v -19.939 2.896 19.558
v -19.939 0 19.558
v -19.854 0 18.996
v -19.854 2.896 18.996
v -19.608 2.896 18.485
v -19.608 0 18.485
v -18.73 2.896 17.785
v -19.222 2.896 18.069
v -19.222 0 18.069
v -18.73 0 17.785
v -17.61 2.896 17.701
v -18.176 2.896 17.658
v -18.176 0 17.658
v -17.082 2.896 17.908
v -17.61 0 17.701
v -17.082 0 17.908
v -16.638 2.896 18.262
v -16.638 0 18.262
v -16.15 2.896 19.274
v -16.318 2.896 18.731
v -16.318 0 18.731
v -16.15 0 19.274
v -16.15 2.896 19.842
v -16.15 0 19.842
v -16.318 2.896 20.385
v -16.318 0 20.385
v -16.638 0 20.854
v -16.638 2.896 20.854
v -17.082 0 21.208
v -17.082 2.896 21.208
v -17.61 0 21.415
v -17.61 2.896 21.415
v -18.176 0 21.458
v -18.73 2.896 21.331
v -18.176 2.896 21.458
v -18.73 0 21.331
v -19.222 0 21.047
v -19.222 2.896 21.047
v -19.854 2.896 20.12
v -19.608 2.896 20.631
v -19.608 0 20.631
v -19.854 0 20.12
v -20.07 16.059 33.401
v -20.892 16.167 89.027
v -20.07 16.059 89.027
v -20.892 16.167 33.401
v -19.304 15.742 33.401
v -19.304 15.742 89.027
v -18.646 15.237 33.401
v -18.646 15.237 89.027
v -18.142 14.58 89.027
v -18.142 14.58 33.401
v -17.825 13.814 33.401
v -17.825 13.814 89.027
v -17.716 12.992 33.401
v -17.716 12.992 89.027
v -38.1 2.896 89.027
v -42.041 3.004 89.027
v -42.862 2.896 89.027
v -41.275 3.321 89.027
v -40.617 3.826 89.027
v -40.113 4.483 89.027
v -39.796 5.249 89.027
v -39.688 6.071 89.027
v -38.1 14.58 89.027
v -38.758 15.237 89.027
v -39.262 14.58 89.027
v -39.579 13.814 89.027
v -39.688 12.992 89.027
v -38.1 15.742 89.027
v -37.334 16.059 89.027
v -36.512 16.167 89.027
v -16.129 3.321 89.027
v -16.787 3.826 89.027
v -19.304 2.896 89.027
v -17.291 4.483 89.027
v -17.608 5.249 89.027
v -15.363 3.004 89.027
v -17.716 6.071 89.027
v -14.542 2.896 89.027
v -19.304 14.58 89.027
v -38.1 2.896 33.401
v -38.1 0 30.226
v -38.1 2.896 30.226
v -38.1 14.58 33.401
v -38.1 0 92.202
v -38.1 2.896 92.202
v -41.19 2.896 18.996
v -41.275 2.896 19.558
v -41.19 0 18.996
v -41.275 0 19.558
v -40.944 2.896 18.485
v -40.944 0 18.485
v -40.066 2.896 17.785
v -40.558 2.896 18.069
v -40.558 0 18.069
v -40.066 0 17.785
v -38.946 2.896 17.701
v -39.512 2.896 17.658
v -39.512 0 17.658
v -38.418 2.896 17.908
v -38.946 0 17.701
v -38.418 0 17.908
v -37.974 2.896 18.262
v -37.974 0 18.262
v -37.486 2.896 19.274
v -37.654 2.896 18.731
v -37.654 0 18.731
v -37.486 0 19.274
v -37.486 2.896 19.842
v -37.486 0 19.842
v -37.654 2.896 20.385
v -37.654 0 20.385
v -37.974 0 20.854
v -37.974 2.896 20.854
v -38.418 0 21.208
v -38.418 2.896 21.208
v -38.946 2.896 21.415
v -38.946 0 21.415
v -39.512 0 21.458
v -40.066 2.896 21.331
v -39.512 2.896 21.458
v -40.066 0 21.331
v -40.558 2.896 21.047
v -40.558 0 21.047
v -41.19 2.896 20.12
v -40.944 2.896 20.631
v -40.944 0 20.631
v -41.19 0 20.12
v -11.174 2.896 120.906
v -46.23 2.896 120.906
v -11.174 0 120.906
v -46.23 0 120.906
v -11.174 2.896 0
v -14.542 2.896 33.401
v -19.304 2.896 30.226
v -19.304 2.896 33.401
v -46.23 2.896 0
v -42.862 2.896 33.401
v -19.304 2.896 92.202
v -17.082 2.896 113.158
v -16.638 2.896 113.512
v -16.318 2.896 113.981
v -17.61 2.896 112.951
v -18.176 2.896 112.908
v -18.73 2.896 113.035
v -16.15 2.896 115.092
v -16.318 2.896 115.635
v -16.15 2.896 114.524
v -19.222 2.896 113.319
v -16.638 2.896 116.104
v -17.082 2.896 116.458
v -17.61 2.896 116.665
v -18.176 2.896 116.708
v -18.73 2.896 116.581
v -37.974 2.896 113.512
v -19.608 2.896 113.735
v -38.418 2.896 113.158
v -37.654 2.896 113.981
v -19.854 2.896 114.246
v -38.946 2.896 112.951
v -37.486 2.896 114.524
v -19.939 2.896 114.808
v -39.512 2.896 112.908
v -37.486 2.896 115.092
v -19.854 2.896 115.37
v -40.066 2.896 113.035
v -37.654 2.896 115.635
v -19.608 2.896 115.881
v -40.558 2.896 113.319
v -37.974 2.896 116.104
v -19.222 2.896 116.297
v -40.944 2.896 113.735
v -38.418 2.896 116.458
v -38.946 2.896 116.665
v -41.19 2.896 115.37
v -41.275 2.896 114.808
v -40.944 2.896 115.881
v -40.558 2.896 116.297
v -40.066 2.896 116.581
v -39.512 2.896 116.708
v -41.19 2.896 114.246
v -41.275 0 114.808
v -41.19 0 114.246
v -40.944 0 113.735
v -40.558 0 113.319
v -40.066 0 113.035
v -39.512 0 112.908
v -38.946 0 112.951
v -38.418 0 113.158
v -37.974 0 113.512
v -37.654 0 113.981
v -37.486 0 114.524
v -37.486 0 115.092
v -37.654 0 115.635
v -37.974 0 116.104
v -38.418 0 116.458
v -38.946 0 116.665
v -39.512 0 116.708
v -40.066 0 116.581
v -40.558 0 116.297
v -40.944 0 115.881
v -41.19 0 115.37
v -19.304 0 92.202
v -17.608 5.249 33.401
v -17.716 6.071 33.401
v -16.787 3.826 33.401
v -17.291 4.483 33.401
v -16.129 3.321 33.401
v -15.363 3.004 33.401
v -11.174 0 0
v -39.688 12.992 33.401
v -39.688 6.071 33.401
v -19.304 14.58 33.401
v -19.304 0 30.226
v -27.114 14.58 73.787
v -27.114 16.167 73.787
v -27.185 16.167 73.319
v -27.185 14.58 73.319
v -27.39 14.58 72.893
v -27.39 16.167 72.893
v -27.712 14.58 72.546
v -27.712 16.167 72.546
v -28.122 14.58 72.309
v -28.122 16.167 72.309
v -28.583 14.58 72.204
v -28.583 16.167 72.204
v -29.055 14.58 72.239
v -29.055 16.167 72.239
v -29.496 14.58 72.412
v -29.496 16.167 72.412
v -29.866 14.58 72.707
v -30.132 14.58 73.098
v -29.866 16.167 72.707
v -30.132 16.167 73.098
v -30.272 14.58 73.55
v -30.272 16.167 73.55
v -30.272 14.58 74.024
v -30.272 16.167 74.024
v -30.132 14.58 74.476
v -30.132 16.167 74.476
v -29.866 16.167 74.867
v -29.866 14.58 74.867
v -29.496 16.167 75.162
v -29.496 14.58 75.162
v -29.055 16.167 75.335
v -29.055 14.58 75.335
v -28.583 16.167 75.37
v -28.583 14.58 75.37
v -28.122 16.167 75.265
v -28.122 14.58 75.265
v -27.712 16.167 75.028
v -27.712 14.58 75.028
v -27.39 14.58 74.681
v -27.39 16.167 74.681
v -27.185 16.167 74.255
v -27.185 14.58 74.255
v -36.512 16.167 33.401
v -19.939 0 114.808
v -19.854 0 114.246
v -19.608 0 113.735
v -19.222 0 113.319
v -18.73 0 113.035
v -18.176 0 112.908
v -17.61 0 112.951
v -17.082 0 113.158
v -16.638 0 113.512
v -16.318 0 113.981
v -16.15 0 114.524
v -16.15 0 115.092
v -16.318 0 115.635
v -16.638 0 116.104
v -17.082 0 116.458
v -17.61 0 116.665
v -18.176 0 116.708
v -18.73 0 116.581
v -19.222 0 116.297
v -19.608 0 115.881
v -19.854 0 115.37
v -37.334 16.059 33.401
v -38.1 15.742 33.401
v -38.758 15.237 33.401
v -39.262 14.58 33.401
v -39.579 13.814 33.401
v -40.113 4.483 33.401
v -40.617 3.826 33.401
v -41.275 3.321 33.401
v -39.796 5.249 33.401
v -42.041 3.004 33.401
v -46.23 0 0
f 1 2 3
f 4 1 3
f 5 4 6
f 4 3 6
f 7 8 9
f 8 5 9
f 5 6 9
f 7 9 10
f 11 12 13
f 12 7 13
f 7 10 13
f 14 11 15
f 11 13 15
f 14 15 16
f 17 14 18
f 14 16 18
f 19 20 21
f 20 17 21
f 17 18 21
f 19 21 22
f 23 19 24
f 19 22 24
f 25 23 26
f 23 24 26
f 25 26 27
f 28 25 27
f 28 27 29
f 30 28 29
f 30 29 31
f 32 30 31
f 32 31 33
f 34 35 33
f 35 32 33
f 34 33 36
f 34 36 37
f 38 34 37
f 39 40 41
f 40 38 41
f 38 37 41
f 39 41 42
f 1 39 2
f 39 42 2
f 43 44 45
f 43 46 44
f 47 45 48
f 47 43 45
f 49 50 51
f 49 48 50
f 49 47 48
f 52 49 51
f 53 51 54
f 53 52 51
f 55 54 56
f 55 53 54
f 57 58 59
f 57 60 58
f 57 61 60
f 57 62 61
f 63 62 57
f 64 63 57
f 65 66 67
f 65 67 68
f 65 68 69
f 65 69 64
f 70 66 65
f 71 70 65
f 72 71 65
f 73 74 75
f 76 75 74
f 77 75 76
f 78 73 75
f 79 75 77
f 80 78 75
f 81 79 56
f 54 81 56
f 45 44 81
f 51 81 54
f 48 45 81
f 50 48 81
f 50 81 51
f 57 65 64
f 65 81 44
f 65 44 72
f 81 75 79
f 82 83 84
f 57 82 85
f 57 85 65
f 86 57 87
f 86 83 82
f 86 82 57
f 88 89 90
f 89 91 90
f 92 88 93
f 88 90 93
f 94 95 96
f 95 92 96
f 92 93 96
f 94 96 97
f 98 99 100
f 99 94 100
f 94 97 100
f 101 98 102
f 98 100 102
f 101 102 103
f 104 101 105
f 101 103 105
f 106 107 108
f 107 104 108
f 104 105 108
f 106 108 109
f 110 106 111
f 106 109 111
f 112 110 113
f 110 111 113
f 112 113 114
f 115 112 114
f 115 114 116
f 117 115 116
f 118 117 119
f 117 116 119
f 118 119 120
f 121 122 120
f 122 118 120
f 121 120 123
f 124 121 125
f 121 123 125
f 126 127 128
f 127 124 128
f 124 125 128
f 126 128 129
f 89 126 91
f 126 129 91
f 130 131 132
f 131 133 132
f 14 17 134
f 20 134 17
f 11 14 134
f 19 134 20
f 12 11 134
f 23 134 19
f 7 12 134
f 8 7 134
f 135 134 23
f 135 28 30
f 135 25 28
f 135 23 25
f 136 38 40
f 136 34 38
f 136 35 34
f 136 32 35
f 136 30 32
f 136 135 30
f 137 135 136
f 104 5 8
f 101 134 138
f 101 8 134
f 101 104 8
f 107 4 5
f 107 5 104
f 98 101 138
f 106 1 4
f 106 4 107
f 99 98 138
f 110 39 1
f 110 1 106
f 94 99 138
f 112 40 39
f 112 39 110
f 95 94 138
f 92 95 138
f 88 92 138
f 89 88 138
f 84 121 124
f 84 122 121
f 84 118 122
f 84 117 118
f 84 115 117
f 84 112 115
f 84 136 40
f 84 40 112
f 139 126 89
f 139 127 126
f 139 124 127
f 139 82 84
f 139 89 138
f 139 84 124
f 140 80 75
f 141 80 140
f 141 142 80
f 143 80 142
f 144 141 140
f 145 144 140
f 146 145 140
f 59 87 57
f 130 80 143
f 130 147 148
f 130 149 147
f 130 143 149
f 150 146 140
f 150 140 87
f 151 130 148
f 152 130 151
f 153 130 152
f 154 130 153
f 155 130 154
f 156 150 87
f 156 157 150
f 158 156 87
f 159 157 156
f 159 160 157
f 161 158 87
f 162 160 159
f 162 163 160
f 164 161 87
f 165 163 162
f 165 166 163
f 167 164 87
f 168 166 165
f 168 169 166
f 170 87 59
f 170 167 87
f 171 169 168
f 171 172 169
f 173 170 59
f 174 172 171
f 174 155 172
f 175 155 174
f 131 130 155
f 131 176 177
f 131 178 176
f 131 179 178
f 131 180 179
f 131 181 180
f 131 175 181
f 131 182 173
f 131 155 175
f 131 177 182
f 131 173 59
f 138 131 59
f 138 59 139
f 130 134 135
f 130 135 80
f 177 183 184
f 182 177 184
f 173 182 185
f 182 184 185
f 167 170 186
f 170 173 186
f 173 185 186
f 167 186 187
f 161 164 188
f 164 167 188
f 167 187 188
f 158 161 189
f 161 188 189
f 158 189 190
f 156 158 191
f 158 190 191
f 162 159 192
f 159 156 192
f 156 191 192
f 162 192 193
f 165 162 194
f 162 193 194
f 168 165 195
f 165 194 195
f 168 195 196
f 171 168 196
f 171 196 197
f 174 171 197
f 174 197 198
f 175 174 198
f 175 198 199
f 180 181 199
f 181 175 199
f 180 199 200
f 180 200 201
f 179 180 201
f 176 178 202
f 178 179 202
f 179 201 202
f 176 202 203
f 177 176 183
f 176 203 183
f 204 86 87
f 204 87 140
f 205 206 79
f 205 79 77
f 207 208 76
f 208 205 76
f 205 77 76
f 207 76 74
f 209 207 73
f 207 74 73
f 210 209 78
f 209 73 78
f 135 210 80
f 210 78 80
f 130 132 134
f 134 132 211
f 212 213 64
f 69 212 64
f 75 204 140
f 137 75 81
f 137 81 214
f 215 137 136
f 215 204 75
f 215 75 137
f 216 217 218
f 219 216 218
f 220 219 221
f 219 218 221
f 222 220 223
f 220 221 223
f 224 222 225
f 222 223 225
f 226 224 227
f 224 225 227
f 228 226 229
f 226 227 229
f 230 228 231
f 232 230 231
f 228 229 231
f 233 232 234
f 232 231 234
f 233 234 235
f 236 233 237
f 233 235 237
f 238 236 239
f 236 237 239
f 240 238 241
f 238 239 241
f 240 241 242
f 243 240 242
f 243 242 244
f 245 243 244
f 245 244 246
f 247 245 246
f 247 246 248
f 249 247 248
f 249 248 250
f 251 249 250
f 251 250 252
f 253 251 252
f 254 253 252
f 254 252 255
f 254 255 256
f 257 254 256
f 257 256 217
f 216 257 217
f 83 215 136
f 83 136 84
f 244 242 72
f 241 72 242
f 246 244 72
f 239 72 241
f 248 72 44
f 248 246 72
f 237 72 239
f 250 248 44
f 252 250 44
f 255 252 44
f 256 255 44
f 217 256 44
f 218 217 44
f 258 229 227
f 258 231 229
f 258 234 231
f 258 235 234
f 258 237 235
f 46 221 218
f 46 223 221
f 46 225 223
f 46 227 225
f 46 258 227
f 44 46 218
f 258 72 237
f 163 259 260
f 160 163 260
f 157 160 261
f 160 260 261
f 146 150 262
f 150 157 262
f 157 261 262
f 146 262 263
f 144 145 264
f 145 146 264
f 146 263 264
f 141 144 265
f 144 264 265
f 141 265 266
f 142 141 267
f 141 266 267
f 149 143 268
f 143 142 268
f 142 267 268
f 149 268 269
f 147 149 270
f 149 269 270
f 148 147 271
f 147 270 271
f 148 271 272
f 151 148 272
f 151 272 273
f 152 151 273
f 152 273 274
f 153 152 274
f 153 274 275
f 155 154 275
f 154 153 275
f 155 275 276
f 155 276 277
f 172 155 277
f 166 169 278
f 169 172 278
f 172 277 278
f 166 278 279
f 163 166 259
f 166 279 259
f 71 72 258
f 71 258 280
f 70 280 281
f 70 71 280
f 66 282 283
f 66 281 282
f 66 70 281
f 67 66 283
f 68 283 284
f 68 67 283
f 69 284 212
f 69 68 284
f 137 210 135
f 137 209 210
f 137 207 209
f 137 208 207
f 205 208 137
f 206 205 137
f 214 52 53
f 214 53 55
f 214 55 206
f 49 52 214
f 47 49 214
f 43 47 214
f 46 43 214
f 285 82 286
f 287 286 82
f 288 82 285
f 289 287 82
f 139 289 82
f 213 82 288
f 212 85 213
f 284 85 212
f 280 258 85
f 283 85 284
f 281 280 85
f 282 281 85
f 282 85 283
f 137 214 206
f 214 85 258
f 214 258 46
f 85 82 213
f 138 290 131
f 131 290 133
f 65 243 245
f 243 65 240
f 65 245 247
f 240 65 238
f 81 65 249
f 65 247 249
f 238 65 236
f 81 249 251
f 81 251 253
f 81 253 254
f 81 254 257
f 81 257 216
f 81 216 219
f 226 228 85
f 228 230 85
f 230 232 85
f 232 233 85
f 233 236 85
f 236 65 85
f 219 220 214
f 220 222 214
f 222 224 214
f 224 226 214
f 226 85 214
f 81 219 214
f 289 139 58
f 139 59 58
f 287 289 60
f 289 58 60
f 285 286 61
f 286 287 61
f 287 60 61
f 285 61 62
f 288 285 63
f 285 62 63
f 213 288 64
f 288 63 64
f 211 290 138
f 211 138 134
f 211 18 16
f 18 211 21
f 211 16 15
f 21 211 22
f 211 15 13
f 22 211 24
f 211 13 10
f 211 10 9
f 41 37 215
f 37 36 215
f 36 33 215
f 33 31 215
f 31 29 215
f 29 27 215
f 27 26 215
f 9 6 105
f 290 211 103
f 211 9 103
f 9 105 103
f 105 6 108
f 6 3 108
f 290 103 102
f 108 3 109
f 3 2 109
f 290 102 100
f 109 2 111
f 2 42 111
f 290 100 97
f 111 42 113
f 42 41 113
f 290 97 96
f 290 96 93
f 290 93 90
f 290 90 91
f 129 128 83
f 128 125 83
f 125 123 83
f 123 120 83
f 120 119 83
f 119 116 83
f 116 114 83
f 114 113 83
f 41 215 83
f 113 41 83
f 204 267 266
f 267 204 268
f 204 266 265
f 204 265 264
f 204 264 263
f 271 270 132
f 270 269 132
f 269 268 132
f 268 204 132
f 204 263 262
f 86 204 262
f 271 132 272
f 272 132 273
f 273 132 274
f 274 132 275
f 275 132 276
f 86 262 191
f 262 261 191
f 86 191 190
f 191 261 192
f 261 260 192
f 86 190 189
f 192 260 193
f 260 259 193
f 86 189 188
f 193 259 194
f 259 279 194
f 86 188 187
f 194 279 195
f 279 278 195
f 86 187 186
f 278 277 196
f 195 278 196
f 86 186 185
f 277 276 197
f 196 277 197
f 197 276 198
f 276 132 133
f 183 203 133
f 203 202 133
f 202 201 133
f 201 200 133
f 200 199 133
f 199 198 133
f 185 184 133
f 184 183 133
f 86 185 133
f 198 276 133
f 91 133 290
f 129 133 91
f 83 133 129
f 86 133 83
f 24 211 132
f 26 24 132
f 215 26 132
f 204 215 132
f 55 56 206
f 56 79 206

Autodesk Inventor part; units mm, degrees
ref_plane "YZ Plane" through (0, 0, 0) normal (1, 0, 0) x (0, 1, 0)
ref_plane "XZ Plane" through (0, 0, 0) normal (0, 1, 0) x (-1, 0, 0)
ref_plane "XY Plane" through (0, 0, 0) normal (0, 0, 1) x (1, 0, 0)
sketch "Sketch1" plane through (0, 0, 0) normal (0, 1, 0) x (-1, 0, 0)
  line L0 (0, 0) -> (57.404, 0) construction
  line L1 (57.404, 0) -> (57.404, 120.904) construction
  line L2 (57.404, 120.904) -> (50.8, 132.334) construction
  line L3 (50.8, 132.334) -> (6.858, 132.334) construction
  line L4 (6.858, 132.334) -> (0, 121.158) construction
  line L5 (0, 121.158) -> (0, 0) construction
  circle A0 centre (4.318, 10.414) radius 0.51 construction
  circle A1 centre (4.318, 17.526) radius 0.51 construction
  circle A2 centre (4.318, 15.366) radius 0.55 construction
  circle A3 centre (4.318, 24.638) radius 0.51 construction
  circle A4 centre (4.318, 22.478) radius 0.55 construction
  circle A5 centre (6.858, 3.302) radius 0.51 construction
  circle A6 centre (6.858, 10.414) radius 0.51 construction
  circle A7 centre (6.858, 17.526) radius 0.51 construction
  circle A8 centre (4.318, 3.302) radius 0.51 construction
  circle A9 centre (4.318, 8.254) radius 0.55 construction
  circle A10 centre (18.542, 10.879) radius 1.27 construction
  circle A11 centre (9.398, 10.414) radius 0.51 construction
  circle A12 centre (9.398, 17.526) radius 0.51 construction
  circle A13 centre (18.034, 19.558) radius 2.15 construction
  circle A14 centre (9.398, 3.302) radius 0.51 construction
  circle A15 centre (23.622, 3.259) radius 1.995 construction
  circle A16 centre (21.082, 13.419) radius 0.8 construction
  circle A17 centre (26.162, 13.419) radius 0.8 construction
  circle A18 centre (53.086, 3.81) radius 0.51 construction
  circle A19 centre (48.006, 3.81) radius 0.51 construction
  circle A20 centre (50.546, 3.81) radius 0.51 construction
  circle A21 centre (53.086, 5.97) radius 0.55 construction
  circle A22 centre (50.546, 10.922) radius 0.51 construction
  circle A23 centre (53.086, 10.922) radius 0.51 construction
  circle A24 centre (48.006, 10.922) radius 0.51 construction
  circle A25 centre (48.006, 18.034) radius 0.51 construction
  circle A26 centre (50.546, 18.034) radius 0.51 construction
  circle A27 centre (53.086, 18.034) radius 0.51 construction
  circle A28 centre (53.086, 13.082) radius 0.55 construction
  circle A29 centre (31.242, 13.419) radius 0.8 construction
  circle A30 centre (36.322, 13.419) radius 0.8 construction
  circle A31 centre (33.782, 3.259) radius 1.995 construction
  circle A32 centre (39.37, 19.558) radius 2.15 construction
  circle A33 centre (38.862, 10.879) radius 1.27 construction
  circle A34 centre (53.086, 20.194) radius 0.55 construction
  circle A35 centre (21.082, 72.644) radius 0.5 construction
  circle A36 centre (21.082, 37.084) radius 0.5 construction
  circle A37 centre (36.322, 52.324) radius 0.5 construction
  circle A38 centre (48.006, 67.818) radius 0.51 construction
  circle A39 centre (55.626, 10.922) radius 0.51 construction
  circle A40 centre (55.626, 3.81) radius 0.51 construction
  circle A41 centre (55.626, 18.034) radius 0.51 construction
  circle A42 centre (1.778, 3.302) radius 0.51 construction
  circle A43 centre (1.778, 10.414) radius 0.51 construction
  circle A44 centre (1.778, 17.526) radius 0.51 construction
  circle A45 centre (1.778, 88.646) radius 0.51 construction
  circle A46 centre (4.318, 88.646) radius 0.51 construction
  circle A47 centre (9.398, 88.646) radius 0.51 construction
  circle A48 centre (6.858, 88.646) radius 0.51 construction
  circle A49 centre (21.082, 87.884) radius 0.5 construction
  circle A50 centre (55.626, 89.154) radius 0.51 construction
  circle A51 centre (53.086, 89.154) radius 0.51 construction
  circle A52 centre (50.546, 89.154) radius 0.51 construction
  circle A53 centre (48.006, 89.154) radius 0.51 construction
  circle A54 centre (36.322, 87.884) radius 0.5 construction
  circle A55 centre (53.086, 84.202) radius 0.55 construction
  circle A56 centre (36.322, 85.344) radius 0.5 construction
  circle A57 centre (4.318, 86.486) radius 0.55 construction
  circle A58 centre (21.082, 85.344) radius 0.5 construction
  circle A59 centre (9.398, 60.198) radius 0.51 construction
  circle A60 centre (21.082, 65.024) radius 0.5 construction
  circle A61 centre (21.082, 62.484) radius 0.5 construction
  circle A62 centre (21.082, 59.944) radius 0.5 construction
  circle A63 centre (9.398, 67.31) radius 0.51 construction
  circle A64 centre (21.082, 75.184) radius 0.5 construction
  circle A65 centre (21.082, 67.564) radius 0.5 construction
  circle A66 centre (21.082, 70.104) radius 0.5 construction
  circle A67 centre (9.398, 74.422) radius 0.51 construction
  circle A68 centre (21.082, 80.264) radius 0.5 construction
  circle A69 centre (21.082, 77.724) radius 0.5 construction
  circle A70 centre (21.082, 82.804) radius 0.5 construction
  circle A71 centre (9.398, 81.534) radius 0.51 construction
  circle A72 centre (50.546, 82.042) radius 0.51 construction
  circle A73 centre (48.006, 82.042) radius 0.51 construction
  circle A74 centre (36.322, 77.724) radius 0.5 construction
  circle A75 centre (36.322, 80.264) radius 0.5 construction
  circle A76 centre (36.322, 82.804) radius 0.5 construction
  circle A77 centre (50.546, 74.93) radius 0.51 construction
  circle A78 centre (48.006, 74.93) radius 0.51 construction
  circle A79 centre (36.322, 75.184) radius 0.5 construction
  circle A80 centre (36.322, 72.644) radius 0.5 construction
  circle A81 centre (36.322, 62.484) radius 0.5 construction
  circle A82 centre (36.322, 65.024) radius 0.5 construction
  circle A83 centre (36.322, 70.104) radius 0.5 construction
  circle A84 centre (36.322, 67.564) radius 0.5 construction
  circle A85 centre (50.546, 67.818) radius 0.51 construction
  circle A86 centre (50.546, 60.706) radius 0.51 construction
  circle A87 centre (48.006, 60.706) radius 0.51 construction
  circle A88 centre (36.322, 59.944) radius 0.5 construction
  circle A89 centre (4.318, 65.15) radius 0.55 construction
  circle A90 centre (4.318, 60.198) radius 0.51 construction
  circle A91 centre (4.318, 67.31) radius 0.51 construction
  circle A92 centre (6.858, 67.31) radius 0.51 construction
  circle A93 centre (6.858, 60.198) radius 0.51 construction
  circle A94 centre (6.858, 81.534) radius 0.51 construction
  circle A95 centre (6.858, 74.422) radius 0.51 construction
  circle A96 centre (4.318, 81.534) radius 0.51 construction
  circle A97 centre (4.318, 72.262) radius 0.55 construction
  circle A98 centre (4.318, 74.422) radius 0.51 construction
  circle A99 centre (4.318, 79.374) radius 0.55 construction
  circle A100 centre (53.086, 69.978) radius 0.55 construction
  circle A101 centre (53.086, 67.818) radius 0.51 construction
  circle A102 centre (53.086, 74.93) radius 0.51 construction
  circle A103 centre (53.086, 60.706) radius 0.51 construction
  circle A104 centre (53.086, 62.866) radius 0.55 construction
  circle A105 centre (53.086, 77.09) radius 0.55 construction
  circle A106 centre (53.086, 82.042) radius 0.51 construction
  circle A107 centre (1.778, 60.198) radius 0.51 construction
  circle A108 centre (1.778, 67.31) radius 0.51 construction
  circle A109 centre (1.778, 81.534) radius 0.51 construction
  circle A110 centre (1.778, 74.422) radius 0.51 construction
  circle A111 centre (55.626, 60.706) radius 0.51 construction
  circle A112 centre (55.626, 67.818) radius 0.51 construction
  circle A113 centre (55.626, 82.042) radius 0.51 construction
  circle A114 centre (55.626, 74.93) radius 0.51 construction
  circle A115 centre (36.322, 57.404) radius 0.5 construction
  circle A116 centre (21.082, 57.404) radius 0.5 construction
  circle A117 centre (4.318, 58.038) radius 0.55 construction
  circle A118 centre (1.778, 24.638) radius 0.51 construction
  circle A119 centre (1.778, 31.75) radius 0.51 construction
  circle A120 centre (4.318, 31.75) radius 0.51 construction
  circle A121 centre (4.318, 29.59) radius 0.55 construction
  circle A122 centre (6.858, 24.638) radius 0.51 construction
  circle A123 centre (6.858, 31.75) radius 0.51 construction
  circle A124 centre (6.858, 38.862) radius 0.51 construction
  circle A125 centre (4.318, 38.862) radius 0.51 construction
  circle A126 centre (1.778, 38.862) radius 0.51 construction
  circle A127 centre (4.318, 36.702) radius 0.55 construction
  circle A128 centre (9.398, 24.638) radius 0.51 construction
  circle A129 centre (21.082, 39.624) radius 0.5 construction
  circle A130 centre (21.082, 32.004) radius 0.5 construction
  circle A131 centre (21.082, 34.544) radius 0.5 construction
  circle A132 centre (9.398, 31.75) radius 0.51 construction
  circle A133 centre (9.398, 38.862) radius 0.51 construction
  circle A134 centre (1.778, 45.974) radius 0.51 construction
  circle A135 centre (6.858, 45.974) radius 0.51 construction
  circle A136 centre (4.318, 45.974) radius 0.51 construction
  circle A137 centre (4.318, 43.814) radius 0.55 construction
  circle A138 centre (9.398, 45.974) radius 0.51 construction
  circle A139 centre (21.082, 44.704) radius 0.5 construction
  circle A140 centre (21.082, 42.164) radius 0.5 construction
  circle A141 centre (21.082, 47.244) radius 0.5 construction
  circle A142 centre (55.626, 46.482) radius 0.51 construction
  circle A143 centre (53.086, 46.482) radius 0.51 construction
  circle A144 centre (50.546, 46.482) radius 0.51 construction
  circle A145 centre (55.626, 39.37) radius 0.51 construction
  circle A146 centre (53.086, 39.37) radius 0.51 construction
  circle A147 centre (50.546, 39.37) radius 0.51 construction
  circle A148 centre (53.086, 41.53) radius 0.55 construction
  circle A149 centre (48.006, 46.482) radius 0.51 construction
  circle A150 centre (48.006, 32.258) radius 0.51 construction
  circle A151 centre (50.546, 32.258) radius 0.51 construction
  circle A152 centre (55.626, 32.258) radius 0.51 construction
  circle A153 centre (53.086, 32.258) radius 0.51 construction
  circle A154 centre (48.006, 39.37) radius 0.51 construction
  circle A155 centre (53.086, 34.418) radius 0.55 construction
  circle A156 centre (53.086, 27.306) radius 0.55 construction
  circle A157 centre (36.322, 34.544) radius 0.5 construction
  circle A158 centre (36.322, 39.624) radius 0.5 construction
  circle A159 centre (36.322, 37.084) radius 0.5 construction
  circle A160 centre (36.322, 42.164) radius 0.5 construction
  circle A161 centre (36.322, 47.244) radius 0.5 construction
  circle A162 centre (36.322, 44.704) radius 0.5 construction
  circle A163 centre (36.322, 32.004) radius 0.5 construction
  circle A164 centre (55.626, 25.146) radius 0.51 construction
  circle A165 centre (53.086, 25.146) radius 0.51 construction
  circle A166 centre (48.006, 25.146) radius 0.51 construction
  circle A167 centre (50.546, 25.146) radius 0.51 construction
  circle A168 centre (36.322, 49.784) radius 0.5 construction
  circle A169 centre (21.082, 49.784) radius 0.5 construction
  circle A170 centre (53.086, 48.642) radius 0.55 construction
  circle A171 centre (4.318, 53.086) radius 0.51 construction
  circle A172 centre (4.318, 50.926) radius 0.55 construction
  circle A173 centre (6.858, 53.086) radius 0.51 construction
  circle A174 centre (9.398, 53.086) radius 0.51 construction
  circle A175 centre (21.082, 52.324) radius 0.5 construction
  circle A176 centre (55.626, 53.594) radius 0.51 construction
  circle A177 centre (53.086, 53.594) radius 0.51 construction
  circle A178 centre (48.006, 53.594) radius 0.51 construction
  circle A179 centre (50.546, 53.594) radius 0.51 construction
  circle A180 centre (1.778, 53.086) radius 0.51 construction
  circle A181 centre (53.086, 55.754) radius 0.55 construction
  circle A182 centre (36.322, 54.864) radius 0.5 construction
  circle A183 centre (21.082, 54.864) radius 0.5 construction
  circle A184 centre (55.626, 96.266) radius 0.51 construction
  circle A185 centre (53.086, 96.266) radius 0.51 construction
  circle A186 centre (53.086, 91.314) radius 0.55 construction
  circle A187 centre (50.546, 96.266) radius 0.51 construction
  circle A188 centre (48.006, 96.266) radius 0.51 construction
  circle A189 centre (36.322, 90.424) radius 0.5 construction
  circle A190 centre (6.858, 95.758) radius 0.51 construction
  circle A191 centre (9.398, 95.758) radius 0.51 construction
  circle A192 centre (21.082, 90.424) radius 0.5 construction
  circle A193 centre (4.318, 95.758) radius 0.51 construction
  circle A194 centre (4.318, 93.598) radius 0.55 construction
  circle A195 centre (1.778, 95.758) radius 0.51 construction
  circle A196 centre (55.626, 117.602) radius 0.51 construction
  circle A197 centre (53.086, 117.602) radius 0.51 construction
  circle A198 centre (48.006, 117.602) radius 0.51 construction
  circle A199 centre (50.546, 117.602) radius 0.51 construction
  circle A200 centre (53.086, 112.65) radius 0.55 construction
  circle A201 centre (53.086, 110.49) radius 0.51 construction
  circle A202 centre (48.006, 110.49) radius 0.51 construction
  circle A203 centre (50.546, 110.49) radius 0.51 construction
  circle A204 centre (55.626, 110.49) radius 0.51 construction
  circle A205 centre (39.37, 114.808) radius 2.15 construction
  circle A206 centre (9.398, 109.982) radius 0.51 construction
  circle A207 centre (9.398, 117.094) radius 0.51 construction
  circle A208 centre (18.034, 114.808) radius 2.15 construction
  circle A209 centre (9.398, 102.87) radius 0.51 construction
  circle A210 centre (53.086, 103.378) radius 0.51 construction
  circle A211 centre (48.006, 103.378) radius 0.51 construction
  circle A212 centre (50.546, 103.378) radius 0.51 construction
  circle A213 centre (53.086, 105.538) radius 0.55 construction
  circle A214 centre (55.626, 103.378) radius 0.51 construction
  circle A215 centre (4.318, 117.094) radius 0.51 construction
  circle A216 centre (4.318, 114.934) radius 0.55 construction
  circle A217 centre (6.858, 117.094) radius 0.51 construction
  circle A218 centre (4.318, 109.982) radius 0.51 construction
  circle A219 centre (6.858, 109.982) radius 0.51 construction
  circle A220 centre (6.858, 102.87) radius 0.51 construction
  circle A221 centre (4.318, 102.87) radius 0.51 construction
  circle A222 centre (4.318, 107.822) radius 0.55 construction
  circle A223 centre (4.318, 100.71) radius 0.55 construction
  circle A224 centre (1.778, 117.094) radius 0.51 construction
  circle A225 centre (1.778, 109.982) radius 0.51 construction
  circle A226 centre (1.778, 102.87) radius 0.51 construction
  circle A227 centre (53.086, 98.426) radius 0.55 construction
  circle A228 centre (10.16, 122.682) radius 0.51 construction
  circle A229 centre (17.272, 122.682) radius 0.51 construction
  circle A230 centre (24.384, 122.682) radius 0.51 construction
  circle A231 centre (38.608, 122.682) radius 0.51 construction
  circle A232 centre (31.496, 122.682) radius 0.51 construction
  circle A233 centre (53.086, 119.762) radius 0.55 construction
  circle A234 centre (45.72, 122.682) radius 0.51 construction
  circle A235 centre (24.384, 130.302) radius 0.51 construction
  circle A236 centre (17.272, 130.302) radius 0.51 construction
  circle A237 centre (22.224, 127.762) radius 0.55 construction
  circle A238 centre (17.272, 127.762) radius 0.51 construction
  circle A239 centre (31.496, 127.762) radius 0.51 construction
  circle A240 centre (29.336, 127.762) radius 0.55 construction
  circle A241 centre (24.384, 127.762) radius 0.51 construction
  circle A242 centre (31.496, 130.302) radius 0.51 construction
  circle A243 centre (17.272, 125.222) radius 0.51 construction
  circle A244 centre (24.384, 125.222) radius 0.51 construction
  circle A245 centre (31.496, 125.222) radius 0.51 construction
  circle A246 centre (38.608, 125.222) radius 0.51 construction
  circle A247 centre (36.448, 127.762) radius 0.55 construction
  circle A248 centre (38.608, 127.762) radius 0.51 construction
  circle A249 centre (38.608, 130.302) radius 0.51 construction
  circle A250 centre (45.72, 130.302) radius 0.51 construction
  circle A251 centre (45.72, 127.762) radius 0.51 construction
  circle A252 centre (43.56, 127.762) radius 0.55 construction
  circle A253 centre (45.72, 125.222) radius 0.51 construction
  circle A254 centre (10.16, 125.222) radius 0.51 construction
  circle A255 centre (10.16, 127.762) radius 0.51 construction
  circle A256 centre (10.16, 130.302) radius 0.51 construction
  circle A257 centre (15.112, 127.762) radius 0.55 construction
  circle A258 centre (8, 127.762) radius 0.55 construction
  circle A259 centre (4.318, 1.142) radius 0.55 construction
  line L6 (-0.0762, -0.0762) -> (57.4802, -0.0762) construction
  line L7 (57.4802, -0.0762) -> (57.4802, 120.9244) construction
  line L8 (57.4802, 120.9244) -> (50.844, 132.4102) construction
  line L9 (50.844, 132.4102) -> (6.8154, 132.4102) construction
  line L10 (6.8154, 132.4102) -> (-0.0762, 121.1795) construction
  line L11 (-0.0762, 121.1795) -> (-0.0762, -0.0762) construction
  line L12 (-1.6637, -1.6637) -> (59.0677, -1.6637) construction
  line L13 (59.0677, -1.6637) -> (59.0677, 121.3501) construction
  line L14 (59.0677, 121.3501) -> (51.7602, 133.9977) construction
  line L15 (51.7602, 133.9977) -> (5.9269, 133.9977) construction
  line L16 (5.9269, 133.9977) -> (-1.6637, 121.6278) construction
  line L17 (-1.6637, 121.6278) -> (-1.6637, -1.6637) construction
  circle A260 centre (39.37, 19.558) radius 1.905 construction
  circle A261 centre (18.034, 19.558) radius 1.905 construction
  circle A262 centre (18.034, 114.808) radius 1.905 construction
  circle A263 centre (39.37, 114.808) radius 1.905 construction
  circle A264 centre (39.37, 114.808) radius 1.905
  circle A265 centre (18.034, 114.808) radius 1.905
  circle A266 centre (18.034, 19.558) radius 1.905
  circle A267 centre (39.37, 19.558) radius 1.905
  line L18 (46.23, 120.906) -> (11.174, 120.906)
  line L19 (11.174, 120.906) -> (11.174, -1.6637)
  line L20 (11.174, -1.6637) -> (46.23, -1.6637)
  line L21 (46.23, -1.6637) -> (46.23, 120.906)
  line L22 (38.1, 92.202) -> (19.304, 92.202)
  line L23 (19.304, 92.202) -> (19.304, 30.226)
  line L24 (19.304, 30.226) -> (38.1, 30.226)
  line L25 (38.1, 30.226) -> (38.1, 92.202)
  line L26 (46.23, 0) -> (11.174, 0)
  point P0 (-98.298, 175.514)
  dimension "d0" = 0.0762
  dimension "d1" = 1.5875
  dimension "d2" = 3.81
  dimension "d3" = 107.4968
  dimension "d4" = 155.702
  dimension "d5" = 1.776
  dimension "d6" = 1.776
  dimension "d7" = 1.776
  dimension "d14" = 1.778
  dimension "d15" = 1.778
  dimension "d16" = 1.778
  dimension "d17" = 1.778
extrude "Extrusion3" add sketch "Sketch1" along normal blind 2.8956 contours L21 L26 L19 L18
sketch "Sketch2" plane through (0, 2.8956, 0) normal (0, 1, 0) x (1, 0, 0)
  line L0 (-38.1, -92.202) -> (-38.1, -30.226) projected
  line L1 (-38.1, -30.226) -> (-39.6875, -30.226)
  line L2 (-39.6875, -30.226) -> (-39.6875, -92.202)
  line L3 (-39.6875, -92.202) -> (-38.1, -92.202)
  line L4 (-38.1, -92.202) -> (-38.1, -30.226)
  line L5 (-19.304, -30.226) -> (-19.304, -92.202) projected
  line L6 (-19.304, -30.226) -> (-17.7165, -30.226)
  line L7 (-17.7165, -30.226) -> (-17.7165, -92.202)
  line L8 (-17.7165, -92.202) -> (-19.304, -92.202)
  line L9 (-19.304, -92.202) -> (-19.304, -30.226)
  line L10 (-19.304, -92.202) -> (-38.1, -92.202) projected
  point P0 (0, 0)
  dimension "d18" = 1.5875
extrude "Extrusion4" add sketch "Sketch2" along normal blind 11.684
fillet "Fillet1" radius 3.175 2 edges at (-17.7165, 2.8956, 61.214) (-39.6875, 2.8956, 61.214)
sketch "Sketch3" plane through (0, 14.5796, 0) normal (0, 1, 0) x (1, 0, 0)
  line L0 (-17.7165, -92.202) -> (-17.7165, -30.226) projected
  line L1 (-17.7165, -30.226) -> (-39.6875, -30.226)
  line L2 (-39.6875, -30.226) -> (-39.6875, -92.202)
  line L3 (-39.6875, -92.202) -> (-17.7165, -92.202)
  line L4 (-17.7165, -92.202) -> (-17.7165, -30.226)
  line L5 (-39.6875, -92.202) -> (-38.1, -92.202) projected
  line L6 (-39.6875, -30.226) -> (-39.6875, -92.202) projected
  point P0 (0, 0)
extrude "Extrusion5" add sketch "Sketch3" along normal blind 1.5875
fillet "Fillet2" radius 3.175 2 edges at (-39.6875, 16.1671, 61.214) (-17.7165, 16.1671, 61.214)
sketch "Sketch4" plane through (-42.8625, 2.8956, 92.202) normal (0, 0, 1) x (1, 0, 0)
  arc A0 (25.146, 10.0965) -> (21.971, 13.2715) centre (21.971, 10.0965) ccw projected
  line L0 (6.35, 13.2715) -> (21.971, 13.2715) projected
  arc A1 (6.35, 13.2715) -> (3.175, 10.0965) centre (6.35, 10.0965) ccw projected
  line L1 (3.175, 3.175) -> (3.175, 10.0965) projected
  arc A2 (0, 0) -> (3.175, 3.175) centre (0, 3.175) ccw projected
  line L2 (4.7625, 0) -> (0, 0) projected
  line L3 (4.7625, 0) -> (4.7625, 11.684) projected
  line L4 (4.7625, 11.684) -> (23.5585, 11.684) projected
  line L5 (23.5585, 0) -> (23.5585, 11.684) projected
  line L6 (28.321, 0) -> (23.5585, 0) projected
  arc A3 (25.146, 3.175) -> (28.321, 0) centre (28.321, 3.175) ccw projected
  line L7 (25.146, 3.175) -> (25.146, 10.0965) projected
  point P0 (42.8625, -2.8956)
extrude "Extrusion6" cut sketch "Sketch4" against normal blind 3.175
sketch "Sketch5" plane through (0, 16.1671, 0) normal (0, 1, 0) x (1, 0, 0)
  circle A0 centre (-28.702, -73.787) radius 1.5875
  line L0 (-36.5125, -89.027) -> (-36.5125, -30.226) projected
  line L1 (-20.8915, -30.226) -> (-20.8915, -89.027) projected
  line L2 (-36.5125, -89.027) -> (-20.8915, -89.027) projected
  point P0 (0, 0)
  dimension "d27" = 7.8105
  dimension "d28" = 7.8105
  dimension "d31" = 15.24
  dimension "d32" = 3.175
extrude "Extrusion7" cut sketch "Sketch5" against normal up to surface (1.5875 mm away)
sketch "Sketch6" plane through (-14.5415, 2.8956, 30.226) normal (0, 0, -1) x (-1, 0, 0)
  arc A0 (6.35, 13.2715) -> (3.175, 10.0965) centre (6.35, 10.0965) ccw projected
  line L0 (3.175, 3.175) -> (3.175, 10.0965) projected
  arc A1 (0, 0) -> (3.175, 3.175) centre (0, 3.175) ccw projected
  line L1 (4.7625, 0) -> (0, 0) projected
  line L2 (4.7625, 0) -> (4.7625, 11.684) projected
  line L3 (4.7625, 11.684) -> (23.5585, 11.684) projected
  line L4 (23.5585, 0) -> (23.5585, 11.684) projected
  line L5 (28.321, 0) -> (23.5585, 0) projected
  arc A2 (25.146, 3.175) -> (28.321, 0) centre (28.321, 3.175) ccw projected
  line L6 (25.146, 3.175) -> (25.146, 10.0965) projected
  arc A3 (25.146, 10.0965) -> (21.971, 13.2715) centre (21.971, 10.0965) ccw projected
  line L7 (6.35, 13.2715) -> (21.971, 13.2715) projected
  point P0 (-14.5415, -2.8956)
extrude "Extrusion8" cut sketch "Sketch6" against normal blind 3.175
equation "\"d6\" = d7"
equation "\"d7\" = d5"
equation "\"d15\" = d14"
equation "\"d16\" = d14"
equation "\"d17\" = d14"
equation "\"d27\" = d28"
properties part number "TopCase"
